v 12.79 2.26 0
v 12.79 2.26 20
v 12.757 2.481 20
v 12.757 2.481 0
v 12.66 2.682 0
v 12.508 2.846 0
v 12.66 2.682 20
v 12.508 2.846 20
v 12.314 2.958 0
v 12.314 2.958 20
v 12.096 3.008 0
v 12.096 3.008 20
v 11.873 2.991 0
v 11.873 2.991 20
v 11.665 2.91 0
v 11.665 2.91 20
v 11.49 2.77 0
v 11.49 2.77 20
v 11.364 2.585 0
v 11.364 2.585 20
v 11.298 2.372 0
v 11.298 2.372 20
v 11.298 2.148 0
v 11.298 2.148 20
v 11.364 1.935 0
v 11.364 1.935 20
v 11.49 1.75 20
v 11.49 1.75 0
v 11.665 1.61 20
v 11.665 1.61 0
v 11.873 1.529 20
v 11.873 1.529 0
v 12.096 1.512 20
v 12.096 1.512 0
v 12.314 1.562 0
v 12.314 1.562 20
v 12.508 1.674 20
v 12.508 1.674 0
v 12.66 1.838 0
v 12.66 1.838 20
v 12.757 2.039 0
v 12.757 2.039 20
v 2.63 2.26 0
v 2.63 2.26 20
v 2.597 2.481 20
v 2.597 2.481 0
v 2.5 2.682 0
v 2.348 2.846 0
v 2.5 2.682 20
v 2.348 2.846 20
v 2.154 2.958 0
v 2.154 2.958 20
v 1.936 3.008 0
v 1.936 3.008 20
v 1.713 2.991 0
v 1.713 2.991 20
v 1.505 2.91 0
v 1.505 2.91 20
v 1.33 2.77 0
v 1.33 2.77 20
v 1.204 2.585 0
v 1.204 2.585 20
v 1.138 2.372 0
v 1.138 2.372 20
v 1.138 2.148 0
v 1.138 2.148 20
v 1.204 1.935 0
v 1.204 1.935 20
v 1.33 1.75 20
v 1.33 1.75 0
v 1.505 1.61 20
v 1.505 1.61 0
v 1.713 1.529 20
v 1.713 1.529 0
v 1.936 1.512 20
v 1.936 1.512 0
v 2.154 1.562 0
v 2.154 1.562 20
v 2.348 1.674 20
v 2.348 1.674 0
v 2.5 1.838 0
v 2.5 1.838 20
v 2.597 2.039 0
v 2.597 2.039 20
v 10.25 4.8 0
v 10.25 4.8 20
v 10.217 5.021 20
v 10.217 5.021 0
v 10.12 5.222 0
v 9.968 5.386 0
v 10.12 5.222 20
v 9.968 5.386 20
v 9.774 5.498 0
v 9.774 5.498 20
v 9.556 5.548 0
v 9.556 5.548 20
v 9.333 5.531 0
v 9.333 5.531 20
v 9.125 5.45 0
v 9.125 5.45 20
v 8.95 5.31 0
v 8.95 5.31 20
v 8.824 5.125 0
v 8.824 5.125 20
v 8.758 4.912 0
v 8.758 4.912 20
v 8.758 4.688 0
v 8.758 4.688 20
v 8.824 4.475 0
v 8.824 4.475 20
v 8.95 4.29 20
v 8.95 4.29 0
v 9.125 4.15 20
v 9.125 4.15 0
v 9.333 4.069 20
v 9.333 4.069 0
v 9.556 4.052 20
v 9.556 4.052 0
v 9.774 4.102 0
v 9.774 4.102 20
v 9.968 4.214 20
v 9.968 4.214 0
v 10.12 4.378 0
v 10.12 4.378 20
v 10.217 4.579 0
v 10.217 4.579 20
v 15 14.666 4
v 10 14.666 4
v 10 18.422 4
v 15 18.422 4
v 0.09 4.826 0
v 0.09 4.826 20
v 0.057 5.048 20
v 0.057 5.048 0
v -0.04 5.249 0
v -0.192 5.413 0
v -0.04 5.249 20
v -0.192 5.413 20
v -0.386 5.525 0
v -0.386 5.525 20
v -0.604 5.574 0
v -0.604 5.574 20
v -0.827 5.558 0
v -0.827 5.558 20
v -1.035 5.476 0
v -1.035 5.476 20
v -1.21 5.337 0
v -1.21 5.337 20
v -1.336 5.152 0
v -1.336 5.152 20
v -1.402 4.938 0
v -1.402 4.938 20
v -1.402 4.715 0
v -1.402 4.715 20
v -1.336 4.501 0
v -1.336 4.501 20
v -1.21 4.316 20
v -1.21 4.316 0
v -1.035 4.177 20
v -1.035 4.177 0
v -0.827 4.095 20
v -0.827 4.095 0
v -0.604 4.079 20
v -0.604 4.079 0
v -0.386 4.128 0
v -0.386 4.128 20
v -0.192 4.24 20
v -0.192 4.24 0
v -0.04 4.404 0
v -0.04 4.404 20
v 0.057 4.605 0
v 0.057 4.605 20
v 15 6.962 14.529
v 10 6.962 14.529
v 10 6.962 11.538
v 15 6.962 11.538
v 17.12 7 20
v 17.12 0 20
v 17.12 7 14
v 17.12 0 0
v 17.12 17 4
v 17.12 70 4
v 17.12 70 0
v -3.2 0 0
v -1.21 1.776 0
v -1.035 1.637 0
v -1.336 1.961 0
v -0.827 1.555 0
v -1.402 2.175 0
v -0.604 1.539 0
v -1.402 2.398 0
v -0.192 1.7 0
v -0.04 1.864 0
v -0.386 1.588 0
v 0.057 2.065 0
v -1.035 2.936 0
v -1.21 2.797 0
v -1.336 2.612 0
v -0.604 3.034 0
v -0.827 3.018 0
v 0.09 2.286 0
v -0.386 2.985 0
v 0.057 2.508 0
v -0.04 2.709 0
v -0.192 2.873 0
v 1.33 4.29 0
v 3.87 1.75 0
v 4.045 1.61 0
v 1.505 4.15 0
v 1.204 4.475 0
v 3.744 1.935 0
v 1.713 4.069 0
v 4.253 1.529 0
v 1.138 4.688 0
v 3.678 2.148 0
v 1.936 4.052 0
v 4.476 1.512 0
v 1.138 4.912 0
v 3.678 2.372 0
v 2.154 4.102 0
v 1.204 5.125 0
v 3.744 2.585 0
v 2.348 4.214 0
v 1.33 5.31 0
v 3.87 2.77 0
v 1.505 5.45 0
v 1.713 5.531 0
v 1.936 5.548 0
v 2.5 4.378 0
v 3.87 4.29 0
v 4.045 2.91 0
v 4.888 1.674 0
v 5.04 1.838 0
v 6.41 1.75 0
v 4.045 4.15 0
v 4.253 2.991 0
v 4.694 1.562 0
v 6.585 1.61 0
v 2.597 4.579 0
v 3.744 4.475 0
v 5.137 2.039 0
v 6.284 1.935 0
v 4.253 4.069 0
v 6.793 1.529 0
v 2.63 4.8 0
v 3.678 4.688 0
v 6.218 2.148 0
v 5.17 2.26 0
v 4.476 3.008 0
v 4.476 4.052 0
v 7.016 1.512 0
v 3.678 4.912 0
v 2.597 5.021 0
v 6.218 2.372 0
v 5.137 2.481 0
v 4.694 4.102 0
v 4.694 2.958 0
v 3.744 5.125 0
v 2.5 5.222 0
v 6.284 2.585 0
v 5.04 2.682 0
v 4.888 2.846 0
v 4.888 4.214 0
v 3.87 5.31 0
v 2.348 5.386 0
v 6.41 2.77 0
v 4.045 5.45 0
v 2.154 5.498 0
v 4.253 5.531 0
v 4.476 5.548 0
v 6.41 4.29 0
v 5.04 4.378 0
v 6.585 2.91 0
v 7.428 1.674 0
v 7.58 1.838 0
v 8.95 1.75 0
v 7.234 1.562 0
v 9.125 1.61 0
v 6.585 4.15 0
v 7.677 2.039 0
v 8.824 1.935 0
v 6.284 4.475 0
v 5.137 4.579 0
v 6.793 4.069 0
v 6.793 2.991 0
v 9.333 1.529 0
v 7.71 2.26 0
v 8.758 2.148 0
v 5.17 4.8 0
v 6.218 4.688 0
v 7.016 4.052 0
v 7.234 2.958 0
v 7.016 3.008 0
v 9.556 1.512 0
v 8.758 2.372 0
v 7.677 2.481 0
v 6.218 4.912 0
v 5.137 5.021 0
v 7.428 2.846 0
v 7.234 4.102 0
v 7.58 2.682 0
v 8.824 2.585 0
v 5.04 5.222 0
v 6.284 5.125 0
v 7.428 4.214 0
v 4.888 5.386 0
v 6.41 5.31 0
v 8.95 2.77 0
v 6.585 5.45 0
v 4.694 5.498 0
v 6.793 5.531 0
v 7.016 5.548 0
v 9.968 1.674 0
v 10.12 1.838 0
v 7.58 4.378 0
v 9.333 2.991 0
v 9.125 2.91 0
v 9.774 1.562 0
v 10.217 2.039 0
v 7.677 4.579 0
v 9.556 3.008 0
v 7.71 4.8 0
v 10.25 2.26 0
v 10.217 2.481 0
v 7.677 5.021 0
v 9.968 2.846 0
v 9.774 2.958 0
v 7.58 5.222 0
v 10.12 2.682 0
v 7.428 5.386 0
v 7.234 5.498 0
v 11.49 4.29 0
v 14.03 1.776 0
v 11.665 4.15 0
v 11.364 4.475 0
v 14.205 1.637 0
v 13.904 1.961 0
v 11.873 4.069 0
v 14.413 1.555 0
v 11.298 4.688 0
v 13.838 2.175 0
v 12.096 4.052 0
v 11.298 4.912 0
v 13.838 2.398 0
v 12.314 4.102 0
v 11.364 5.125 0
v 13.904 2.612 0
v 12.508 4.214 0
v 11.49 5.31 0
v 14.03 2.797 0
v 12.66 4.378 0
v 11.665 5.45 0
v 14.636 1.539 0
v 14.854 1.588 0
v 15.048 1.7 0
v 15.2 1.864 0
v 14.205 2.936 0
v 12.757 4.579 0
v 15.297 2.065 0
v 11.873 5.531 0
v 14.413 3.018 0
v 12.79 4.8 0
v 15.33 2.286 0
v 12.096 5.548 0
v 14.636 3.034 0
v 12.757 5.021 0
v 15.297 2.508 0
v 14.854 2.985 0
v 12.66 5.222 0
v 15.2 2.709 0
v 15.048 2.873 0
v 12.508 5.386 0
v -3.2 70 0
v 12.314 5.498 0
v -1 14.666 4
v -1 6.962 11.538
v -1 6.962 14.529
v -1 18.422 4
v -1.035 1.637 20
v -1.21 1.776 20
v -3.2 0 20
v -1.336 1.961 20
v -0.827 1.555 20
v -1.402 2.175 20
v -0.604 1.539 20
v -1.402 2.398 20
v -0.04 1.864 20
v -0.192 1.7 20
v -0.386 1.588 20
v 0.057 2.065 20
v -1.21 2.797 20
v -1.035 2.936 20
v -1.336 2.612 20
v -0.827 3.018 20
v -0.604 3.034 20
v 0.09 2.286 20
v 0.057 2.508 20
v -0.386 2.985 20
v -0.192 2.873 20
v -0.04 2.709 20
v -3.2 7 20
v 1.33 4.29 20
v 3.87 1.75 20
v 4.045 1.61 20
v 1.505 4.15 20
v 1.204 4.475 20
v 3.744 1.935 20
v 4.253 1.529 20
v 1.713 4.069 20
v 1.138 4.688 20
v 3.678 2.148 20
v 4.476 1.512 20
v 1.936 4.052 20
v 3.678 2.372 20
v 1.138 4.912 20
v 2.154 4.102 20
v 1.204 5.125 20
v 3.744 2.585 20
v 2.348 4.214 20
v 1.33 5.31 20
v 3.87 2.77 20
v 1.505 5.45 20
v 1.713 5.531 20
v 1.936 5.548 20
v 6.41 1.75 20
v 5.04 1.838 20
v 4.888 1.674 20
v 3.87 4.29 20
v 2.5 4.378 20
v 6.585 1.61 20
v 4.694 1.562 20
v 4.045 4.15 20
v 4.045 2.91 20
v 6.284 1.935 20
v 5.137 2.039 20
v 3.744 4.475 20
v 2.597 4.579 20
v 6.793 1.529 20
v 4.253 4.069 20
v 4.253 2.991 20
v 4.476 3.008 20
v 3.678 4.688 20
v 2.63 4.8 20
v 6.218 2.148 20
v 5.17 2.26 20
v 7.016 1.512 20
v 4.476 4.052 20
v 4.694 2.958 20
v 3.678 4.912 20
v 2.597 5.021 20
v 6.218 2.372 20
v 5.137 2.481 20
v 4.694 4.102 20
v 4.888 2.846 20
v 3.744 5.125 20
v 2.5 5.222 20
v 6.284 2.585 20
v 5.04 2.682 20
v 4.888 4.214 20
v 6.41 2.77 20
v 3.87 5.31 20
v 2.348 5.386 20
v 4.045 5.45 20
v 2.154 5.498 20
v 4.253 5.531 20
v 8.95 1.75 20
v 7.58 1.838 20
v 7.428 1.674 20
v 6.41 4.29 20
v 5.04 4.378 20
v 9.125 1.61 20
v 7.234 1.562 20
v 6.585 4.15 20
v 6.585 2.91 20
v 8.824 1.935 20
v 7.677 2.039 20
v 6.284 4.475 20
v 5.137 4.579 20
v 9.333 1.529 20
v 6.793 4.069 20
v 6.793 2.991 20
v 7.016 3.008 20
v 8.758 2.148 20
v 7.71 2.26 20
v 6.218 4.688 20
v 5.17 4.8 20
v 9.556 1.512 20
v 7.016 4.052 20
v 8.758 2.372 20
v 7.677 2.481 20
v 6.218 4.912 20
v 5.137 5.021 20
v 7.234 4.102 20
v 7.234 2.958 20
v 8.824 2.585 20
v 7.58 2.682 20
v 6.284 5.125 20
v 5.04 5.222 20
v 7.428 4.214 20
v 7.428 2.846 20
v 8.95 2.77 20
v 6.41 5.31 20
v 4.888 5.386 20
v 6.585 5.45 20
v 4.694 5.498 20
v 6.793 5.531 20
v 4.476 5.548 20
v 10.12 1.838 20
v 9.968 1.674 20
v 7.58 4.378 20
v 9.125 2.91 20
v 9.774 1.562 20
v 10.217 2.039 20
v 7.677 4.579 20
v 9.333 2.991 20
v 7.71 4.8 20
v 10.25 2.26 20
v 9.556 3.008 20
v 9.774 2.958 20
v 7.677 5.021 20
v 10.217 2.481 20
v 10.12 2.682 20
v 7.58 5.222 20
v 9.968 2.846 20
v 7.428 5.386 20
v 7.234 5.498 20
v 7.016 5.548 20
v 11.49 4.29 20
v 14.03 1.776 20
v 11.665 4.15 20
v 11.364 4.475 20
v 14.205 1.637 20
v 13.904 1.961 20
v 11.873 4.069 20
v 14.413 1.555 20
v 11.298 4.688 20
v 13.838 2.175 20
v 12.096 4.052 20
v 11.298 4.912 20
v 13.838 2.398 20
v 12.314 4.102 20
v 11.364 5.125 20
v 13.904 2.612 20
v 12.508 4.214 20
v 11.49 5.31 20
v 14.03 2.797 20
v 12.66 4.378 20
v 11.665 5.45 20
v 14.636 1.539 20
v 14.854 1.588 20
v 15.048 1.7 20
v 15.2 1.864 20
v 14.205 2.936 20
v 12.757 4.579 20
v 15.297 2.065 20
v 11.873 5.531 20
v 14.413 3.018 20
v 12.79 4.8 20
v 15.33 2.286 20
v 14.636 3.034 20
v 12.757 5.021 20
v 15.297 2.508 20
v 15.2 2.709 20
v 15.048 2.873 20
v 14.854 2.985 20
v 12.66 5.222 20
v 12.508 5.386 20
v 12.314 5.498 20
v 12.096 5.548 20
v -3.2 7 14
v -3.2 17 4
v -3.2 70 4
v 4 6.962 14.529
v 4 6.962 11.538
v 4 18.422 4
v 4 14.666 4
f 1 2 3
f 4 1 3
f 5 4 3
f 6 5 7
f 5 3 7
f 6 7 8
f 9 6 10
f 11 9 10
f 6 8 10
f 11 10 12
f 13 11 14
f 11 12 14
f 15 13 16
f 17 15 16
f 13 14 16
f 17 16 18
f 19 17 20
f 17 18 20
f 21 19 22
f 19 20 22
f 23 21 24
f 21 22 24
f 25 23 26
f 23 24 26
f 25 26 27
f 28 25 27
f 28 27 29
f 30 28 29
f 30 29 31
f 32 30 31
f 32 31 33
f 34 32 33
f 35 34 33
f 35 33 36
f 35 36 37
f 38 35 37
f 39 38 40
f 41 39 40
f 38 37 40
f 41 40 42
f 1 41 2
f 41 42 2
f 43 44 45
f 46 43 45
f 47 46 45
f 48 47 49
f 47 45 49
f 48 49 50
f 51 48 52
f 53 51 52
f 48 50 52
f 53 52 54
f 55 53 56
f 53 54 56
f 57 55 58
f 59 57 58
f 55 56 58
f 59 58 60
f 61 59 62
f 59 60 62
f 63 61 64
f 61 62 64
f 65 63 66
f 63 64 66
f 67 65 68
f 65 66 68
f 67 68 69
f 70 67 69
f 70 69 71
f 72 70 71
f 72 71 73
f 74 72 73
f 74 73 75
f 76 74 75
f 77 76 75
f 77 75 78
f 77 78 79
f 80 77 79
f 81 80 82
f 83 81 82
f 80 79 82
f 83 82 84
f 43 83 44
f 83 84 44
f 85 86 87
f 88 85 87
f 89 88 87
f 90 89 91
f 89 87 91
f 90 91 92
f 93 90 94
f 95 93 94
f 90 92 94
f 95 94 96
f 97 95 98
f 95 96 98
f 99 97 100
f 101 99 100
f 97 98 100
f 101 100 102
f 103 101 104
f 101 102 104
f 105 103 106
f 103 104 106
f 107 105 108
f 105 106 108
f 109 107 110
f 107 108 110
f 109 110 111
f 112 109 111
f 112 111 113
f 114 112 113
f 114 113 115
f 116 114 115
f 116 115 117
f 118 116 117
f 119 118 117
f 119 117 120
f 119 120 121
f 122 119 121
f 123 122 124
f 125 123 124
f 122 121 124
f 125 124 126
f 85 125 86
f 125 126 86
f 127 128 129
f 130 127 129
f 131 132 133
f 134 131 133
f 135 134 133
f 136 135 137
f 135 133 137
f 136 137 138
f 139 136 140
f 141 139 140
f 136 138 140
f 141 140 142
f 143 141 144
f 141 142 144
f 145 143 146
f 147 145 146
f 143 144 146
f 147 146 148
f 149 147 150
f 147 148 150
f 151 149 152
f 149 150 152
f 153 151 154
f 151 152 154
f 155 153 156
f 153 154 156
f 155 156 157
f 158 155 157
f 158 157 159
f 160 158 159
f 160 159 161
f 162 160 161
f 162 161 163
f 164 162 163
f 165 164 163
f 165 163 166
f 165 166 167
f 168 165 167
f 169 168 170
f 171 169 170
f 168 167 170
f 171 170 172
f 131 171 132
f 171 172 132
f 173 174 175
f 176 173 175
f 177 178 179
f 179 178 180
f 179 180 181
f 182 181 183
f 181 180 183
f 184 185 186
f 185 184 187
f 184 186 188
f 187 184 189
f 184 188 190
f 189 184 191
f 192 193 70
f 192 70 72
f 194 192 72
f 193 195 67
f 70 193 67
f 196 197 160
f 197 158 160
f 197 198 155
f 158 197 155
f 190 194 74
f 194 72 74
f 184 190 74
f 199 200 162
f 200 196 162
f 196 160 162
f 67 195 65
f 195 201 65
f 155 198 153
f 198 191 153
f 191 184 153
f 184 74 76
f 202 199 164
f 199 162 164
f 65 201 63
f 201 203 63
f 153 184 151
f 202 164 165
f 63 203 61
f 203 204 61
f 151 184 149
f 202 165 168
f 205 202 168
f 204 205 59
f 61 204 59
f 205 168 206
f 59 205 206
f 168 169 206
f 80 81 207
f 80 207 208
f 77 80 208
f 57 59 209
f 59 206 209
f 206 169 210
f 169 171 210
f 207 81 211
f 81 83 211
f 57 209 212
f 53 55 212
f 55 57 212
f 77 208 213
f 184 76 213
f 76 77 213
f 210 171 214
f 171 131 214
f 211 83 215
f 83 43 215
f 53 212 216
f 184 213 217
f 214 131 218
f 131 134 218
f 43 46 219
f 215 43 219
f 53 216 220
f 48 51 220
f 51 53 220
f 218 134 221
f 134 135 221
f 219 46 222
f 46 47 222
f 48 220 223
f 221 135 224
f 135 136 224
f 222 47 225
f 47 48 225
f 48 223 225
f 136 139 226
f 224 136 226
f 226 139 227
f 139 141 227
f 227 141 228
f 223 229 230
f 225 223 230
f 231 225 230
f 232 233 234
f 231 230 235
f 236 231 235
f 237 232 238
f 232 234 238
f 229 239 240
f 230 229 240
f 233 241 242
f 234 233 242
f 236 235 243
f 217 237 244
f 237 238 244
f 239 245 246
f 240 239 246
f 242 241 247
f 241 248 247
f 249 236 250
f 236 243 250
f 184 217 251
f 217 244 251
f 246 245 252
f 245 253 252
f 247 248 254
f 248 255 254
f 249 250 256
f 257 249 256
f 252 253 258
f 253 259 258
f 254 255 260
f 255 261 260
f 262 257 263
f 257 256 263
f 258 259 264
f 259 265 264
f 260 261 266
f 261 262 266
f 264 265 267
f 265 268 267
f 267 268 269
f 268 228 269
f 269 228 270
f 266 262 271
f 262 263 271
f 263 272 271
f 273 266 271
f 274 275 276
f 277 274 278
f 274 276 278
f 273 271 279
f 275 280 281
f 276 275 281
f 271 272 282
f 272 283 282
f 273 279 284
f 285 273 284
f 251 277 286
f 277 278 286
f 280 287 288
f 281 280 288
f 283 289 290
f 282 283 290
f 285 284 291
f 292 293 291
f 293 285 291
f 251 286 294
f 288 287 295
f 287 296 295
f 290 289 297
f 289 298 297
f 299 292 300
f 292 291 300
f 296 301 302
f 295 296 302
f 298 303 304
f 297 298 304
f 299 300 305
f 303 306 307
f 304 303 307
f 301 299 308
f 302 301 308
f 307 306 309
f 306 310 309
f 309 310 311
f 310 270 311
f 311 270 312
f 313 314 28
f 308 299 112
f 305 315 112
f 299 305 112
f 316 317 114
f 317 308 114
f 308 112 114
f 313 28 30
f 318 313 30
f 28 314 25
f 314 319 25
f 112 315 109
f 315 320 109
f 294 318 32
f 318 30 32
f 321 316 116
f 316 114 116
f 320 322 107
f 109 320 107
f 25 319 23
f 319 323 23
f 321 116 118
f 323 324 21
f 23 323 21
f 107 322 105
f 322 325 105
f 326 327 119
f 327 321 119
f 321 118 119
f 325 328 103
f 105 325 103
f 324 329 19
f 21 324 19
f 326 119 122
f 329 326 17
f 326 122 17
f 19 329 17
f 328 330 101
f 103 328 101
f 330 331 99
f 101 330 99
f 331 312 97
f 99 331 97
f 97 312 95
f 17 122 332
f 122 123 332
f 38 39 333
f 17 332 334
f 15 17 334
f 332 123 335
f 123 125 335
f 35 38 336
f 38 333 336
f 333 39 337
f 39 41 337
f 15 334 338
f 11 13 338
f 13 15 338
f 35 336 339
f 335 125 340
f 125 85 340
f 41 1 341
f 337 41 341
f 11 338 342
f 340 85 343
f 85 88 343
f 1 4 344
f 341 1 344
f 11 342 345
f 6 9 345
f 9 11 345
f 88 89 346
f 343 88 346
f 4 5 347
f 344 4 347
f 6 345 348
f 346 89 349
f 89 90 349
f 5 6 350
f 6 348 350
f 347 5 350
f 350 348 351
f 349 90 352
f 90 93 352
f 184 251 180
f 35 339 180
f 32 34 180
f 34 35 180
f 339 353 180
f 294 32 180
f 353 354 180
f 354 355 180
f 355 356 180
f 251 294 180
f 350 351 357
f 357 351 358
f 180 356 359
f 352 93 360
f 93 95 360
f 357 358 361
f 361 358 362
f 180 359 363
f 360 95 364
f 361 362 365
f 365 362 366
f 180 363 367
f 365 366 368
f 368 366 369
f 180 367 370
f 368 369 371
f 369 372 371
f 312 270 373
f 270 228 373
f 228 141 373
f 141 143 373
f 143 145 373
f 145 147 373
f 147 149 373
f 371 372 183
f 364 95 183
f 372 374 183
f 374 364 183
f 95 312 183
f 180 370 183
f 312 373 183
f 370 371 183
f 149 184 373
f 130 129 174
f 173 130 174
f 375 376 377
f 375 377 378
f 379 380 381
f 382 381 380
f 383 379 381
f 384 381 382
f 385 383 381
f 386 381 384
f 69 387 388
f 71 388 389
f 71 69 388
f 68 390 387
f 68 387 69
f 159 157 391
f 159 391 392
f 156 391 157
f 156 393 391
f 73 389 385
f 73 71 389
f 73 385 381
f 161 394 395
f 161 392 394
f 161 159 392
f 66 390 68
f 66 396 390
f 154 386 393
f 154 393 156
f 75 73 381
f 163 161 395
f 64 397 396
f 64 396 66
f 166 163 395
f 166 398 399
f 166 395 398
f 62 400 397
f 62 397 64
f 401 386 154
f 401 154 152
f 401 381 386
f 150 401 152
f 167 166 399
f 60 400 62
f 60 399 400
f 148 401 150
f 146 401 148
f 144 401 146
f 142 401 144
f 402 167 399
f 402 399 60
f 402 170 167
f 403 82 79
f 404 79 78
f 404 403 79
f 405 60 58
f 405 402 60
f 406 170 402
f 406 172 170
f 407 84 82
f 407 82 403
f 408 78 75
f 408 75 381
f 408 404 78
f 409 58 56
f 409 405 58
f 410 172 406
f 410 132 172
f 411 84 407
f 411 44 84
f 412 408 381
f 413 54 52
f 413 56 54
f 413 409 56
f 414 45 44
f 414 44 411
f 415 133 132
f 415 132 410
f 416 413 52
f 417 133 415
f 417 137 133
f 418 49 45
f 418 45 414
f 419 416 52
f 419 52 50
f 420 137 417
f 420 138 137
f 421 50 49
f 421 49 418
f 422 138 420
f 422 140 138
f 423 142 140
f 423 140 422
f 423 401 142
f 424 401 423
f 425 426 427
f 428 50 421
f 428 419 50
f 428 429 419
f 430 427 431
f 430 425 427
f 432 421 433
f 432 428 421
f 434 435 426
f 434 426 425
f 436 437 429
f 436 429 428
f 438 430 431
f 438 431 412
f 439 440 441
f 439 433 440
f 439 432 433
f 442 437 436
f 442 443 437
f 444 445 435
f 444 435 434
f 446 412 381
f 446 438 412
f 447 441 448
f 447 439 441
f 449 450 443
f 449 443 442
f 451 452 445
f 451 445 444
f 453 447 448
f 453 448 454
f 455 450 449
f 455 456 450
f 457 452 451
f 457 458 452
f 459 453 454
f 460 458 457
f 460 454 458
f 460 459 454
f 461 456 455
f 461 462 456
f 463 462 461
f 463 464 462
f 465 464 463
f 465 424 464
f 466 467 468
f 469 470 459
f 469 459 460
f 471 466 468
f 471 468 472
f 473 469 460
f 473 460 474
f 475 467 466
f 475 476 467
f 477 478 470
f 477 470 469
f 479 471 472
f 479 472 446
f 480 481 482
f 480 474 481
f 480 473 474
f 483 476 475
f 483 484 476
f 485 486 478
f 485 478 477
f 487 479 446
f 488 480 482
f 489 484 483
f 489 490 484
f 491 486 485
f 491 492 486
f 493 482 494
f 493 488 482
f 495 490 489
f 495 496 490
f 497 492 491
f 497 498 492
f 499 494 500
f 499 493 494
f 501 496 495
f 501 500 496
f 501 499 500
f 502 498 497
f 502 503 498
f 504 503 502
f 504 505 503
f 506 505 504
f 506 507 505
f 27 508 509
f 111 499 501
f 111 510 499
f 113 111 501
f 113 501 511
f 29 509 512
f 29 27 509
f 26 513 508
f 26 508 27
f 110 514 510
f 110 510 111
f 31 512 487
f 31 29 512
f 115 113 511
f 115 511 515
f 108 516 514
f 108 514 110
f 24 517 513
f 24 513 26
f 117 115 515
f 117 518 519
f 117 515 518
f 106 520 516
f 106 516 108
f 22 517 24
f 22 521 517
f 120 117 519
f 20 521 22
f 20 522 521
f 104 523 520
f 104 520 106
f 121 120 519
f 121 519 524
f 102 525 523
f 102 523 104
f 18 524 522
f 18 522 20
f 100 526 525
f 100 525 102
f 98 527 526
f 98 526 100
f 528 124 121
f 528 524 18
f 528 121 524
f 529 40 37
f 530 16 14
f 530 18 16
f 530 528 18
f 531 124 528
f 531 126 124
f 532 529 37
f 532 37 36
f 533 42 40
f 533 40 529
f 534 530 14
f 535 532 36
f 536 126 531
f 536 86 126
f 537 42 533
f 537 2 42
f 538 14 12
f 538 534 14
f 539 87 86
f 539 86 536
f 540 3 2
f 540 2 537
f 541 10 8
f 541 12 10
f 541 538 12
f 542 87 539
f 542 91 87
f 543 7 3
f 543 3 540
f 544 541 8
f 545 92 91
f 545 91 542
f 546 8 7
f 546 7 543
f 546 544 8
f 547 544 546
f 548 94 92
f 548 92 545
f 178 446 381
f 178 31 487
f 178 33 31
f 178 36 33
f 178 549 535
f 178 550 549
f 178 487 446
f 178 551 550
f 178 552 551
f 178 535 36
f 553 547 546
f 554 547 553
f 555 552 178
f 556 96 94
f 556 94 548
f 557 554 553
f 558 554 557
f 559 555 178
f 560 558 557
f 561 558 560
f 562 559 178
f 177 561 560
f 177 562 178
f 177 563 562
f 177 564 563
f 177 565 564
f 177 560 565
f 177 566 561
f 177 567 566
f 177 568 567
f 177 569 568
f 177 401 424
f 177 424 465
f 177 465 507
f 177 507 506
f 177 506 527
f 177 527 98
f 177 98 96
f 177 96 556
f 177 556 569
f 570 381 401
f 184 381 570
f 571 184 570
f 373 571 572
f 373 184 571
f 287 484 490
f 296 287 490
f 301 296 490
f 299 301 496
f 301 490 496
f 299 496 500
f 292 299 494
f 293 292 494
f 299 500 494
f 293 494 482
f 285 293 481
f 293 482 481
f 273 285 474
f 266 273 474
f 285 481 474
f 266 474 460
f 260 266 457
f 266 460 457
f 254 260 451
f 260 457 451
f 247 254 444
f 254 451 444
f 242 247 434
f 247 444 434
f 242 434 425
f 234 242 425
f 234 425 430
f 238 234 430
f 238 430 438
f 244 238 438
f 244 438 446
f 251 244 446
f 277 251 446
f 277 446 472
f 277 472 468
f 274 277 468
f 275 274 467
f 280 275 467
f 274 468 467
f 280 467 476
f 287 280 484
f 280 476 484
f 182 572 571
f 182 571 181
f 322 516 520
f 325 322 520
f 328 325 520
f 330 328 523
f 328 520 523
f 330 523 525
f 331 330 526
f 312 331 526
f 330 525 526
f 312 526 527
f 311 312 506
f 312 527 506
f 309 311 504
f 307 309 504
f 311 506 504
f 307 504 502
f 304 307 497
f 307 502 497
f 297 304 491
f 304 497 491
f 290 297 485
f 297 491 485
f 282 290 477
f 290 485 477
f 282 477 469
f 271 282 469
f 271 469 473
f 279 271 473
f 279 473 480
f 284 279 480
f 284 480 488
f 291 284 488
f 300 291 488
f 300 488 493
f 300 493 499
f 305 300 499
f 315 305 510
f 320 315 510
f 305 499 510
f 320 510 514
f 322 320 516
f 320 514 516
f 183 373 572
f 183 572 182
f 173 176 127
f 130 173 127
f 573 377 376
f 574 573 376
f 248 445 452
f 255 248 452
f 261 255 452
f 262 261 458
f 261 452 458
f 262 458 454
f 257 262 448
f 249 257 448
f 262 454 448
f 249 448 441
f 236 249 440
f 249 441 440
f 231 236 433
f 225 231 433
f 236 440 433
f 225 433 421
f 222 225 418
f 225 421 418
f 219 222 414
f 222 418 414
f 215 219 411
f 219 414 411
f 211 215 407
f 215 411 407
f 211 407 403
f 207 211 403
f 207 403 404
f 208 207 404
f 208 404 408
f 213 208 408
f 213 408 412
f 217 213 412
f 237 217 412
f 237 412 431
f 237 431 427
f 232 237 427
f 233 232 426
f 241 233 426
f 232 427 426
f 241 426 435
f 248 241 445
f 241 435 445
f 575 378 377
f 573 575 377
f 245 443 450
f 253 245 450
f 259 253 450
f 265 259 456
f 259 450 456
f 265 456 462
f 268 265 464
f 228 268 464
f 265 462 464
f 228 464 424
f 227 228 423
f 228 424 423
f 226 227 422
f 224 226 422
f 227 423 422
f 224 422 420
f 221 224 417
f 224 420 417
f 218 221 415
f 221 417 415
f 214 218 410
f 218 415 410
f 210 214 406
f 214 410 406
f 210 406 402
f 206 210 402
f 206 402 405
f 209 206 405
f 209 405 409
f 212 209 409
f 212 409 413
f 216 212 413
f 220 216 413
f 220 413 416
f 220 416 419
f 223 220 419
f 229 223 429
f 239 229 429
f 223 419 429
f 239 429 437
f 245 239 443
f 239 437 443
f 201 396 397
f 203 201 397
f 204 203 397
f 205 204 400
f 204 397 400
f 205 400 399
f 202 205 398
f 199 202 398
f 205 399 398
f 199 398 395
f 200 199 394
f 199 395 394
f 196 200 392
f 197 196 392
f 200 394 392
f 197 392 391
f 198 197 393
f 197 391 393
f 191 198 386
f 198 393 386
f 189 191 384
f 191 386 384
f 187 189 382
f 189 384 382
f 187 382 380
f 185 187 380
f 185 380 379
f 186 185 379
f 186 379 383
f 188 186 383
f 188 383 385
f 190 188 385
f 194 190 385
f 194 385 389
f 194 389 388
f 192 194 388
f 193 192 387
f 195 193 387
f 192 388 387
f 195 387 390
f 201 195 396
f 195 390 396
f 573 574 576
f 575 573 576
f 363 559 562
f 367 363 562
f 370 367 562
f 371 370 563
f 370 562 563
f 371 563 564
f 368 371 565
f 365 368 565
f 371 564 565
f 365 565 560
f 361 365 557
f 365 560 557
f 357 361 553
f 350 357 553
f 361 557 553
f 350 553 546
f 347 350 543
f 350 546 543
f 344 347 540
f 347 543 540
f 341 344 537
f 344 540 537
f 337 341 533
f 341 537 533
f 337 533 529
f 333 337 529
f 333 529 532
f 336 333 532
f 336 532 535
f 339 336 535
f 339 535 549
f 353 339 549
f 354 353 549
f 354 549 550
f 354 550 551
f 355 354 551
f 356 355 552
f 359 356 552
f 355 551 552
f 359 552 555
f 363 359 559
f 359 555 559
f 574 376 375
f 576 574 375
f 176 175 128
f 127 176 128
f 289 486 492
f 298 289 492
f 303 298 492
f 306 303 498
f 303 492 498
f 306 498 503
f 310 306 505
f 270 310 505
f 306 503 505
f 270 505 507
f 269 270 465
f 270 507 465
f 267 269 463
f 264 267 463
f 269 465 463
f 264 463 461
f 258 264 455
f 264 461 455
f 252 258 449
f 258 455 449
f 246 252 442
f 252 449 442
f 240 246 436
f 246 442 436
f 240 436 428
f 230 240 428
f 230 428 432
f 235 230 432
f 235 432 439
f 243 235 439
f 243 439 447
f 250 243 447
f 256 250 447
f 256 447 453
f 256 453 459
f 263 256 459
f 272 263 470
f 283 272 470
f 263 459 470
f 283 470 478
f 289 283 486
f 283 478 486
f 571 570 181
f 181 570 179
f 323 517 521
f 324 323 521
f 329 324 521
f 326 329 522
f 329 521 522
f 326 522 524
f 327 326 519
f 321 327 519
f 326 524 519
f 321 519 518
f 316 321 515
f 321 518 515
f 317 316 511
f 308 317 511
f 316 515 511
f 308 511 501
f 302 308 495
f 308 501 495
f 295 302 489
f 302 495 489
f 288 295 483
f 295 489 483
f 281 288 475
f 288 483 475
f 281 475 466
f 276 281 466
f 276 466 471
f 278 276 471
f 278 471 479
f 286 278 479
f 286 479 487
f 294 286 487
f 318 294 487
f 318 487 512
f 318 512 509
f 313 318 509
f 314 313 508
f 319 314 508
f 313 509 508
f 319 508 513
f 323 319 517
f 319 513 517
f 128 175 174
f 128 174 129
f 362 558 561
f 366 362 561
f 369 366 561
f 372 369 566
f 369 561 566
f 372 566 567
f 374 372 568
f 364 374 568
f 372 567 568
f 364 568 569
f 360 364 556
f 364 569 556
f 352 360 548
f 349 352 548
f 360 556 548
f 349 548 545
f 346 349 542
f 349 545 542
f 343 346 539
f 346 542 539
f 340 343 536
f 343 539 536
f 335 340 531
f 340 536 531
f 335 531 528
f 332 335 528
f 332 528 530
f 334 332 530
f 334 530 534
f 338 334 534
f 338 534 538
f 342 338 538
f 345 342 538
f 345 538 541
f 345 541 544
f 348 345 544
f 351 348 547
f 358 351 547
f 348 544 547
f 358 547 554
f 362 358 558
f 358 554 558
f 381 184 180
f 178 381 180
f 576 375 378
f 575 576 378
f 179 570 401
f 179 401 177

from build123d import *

# Parameters (mm, degrees)
PAD_DEPTH    = 5
PAD001_DEPTH = 5
BOX002_W     = 20.32
BOX002_H     = 63
BOX002_DEPTH = 4
BOX_W        = 20.32
BOX_H        = 7
BOX_DEPTH    = 20
SKETCH_R     = 0.75
POCKET_DEPTH = 20
CHAMFER_SIZE = 10


with BuildPart() as pad:
    # Sketch001 → Pad (new body)
    with BuildSketch(Plane.YZ.offset(-1)):
        Polygon((6.961547, 14.529416), (6.961547, 11.537694), (14.666037, 4), (18.422146, 4), align=None)
    extrude(amount=PAD_DEPTH)


with BuildPart() as pad001:
    # Sketch002 → Pad001 (new body)
    with BuildSketch(Plane.YZ.offset(10)):
        Polygon((6.961547, 14.529416), (6.961547, 11.537694), (14.666037, 4), (18.422146, 4), align=None)
    extrude(amount=PAD001_DEPTH)


with BuildPart() as cube002:
    # Box002 → Box002 (new body)
    with BuildSketch(Plane(origin=(-3.2, 7, 0), x_dir=(1, 0, 0), z_dir=(0, 0, 1))):
        with Locations((10.16, 31.5)):
            Rectangle(BOX002_W, BOX002_H)
    extrude(amount=BOX002_DEPTH)


with BuildPart() as chamfer_body:
    # Box → Box (new body)
    with BuildSketch(Plane(origin=(-3.2, 0, 0), x_dir=(1, 0, 0), z_dir=(0, 0, 1))):
        with Locations((10.16, 3.5)):
            Rectangle(BOX_W, BOX_H)
    extrude(amount=BOX_DEPTH)

    # Sketch → Pocket (cut)
    with BuildSketch(Plane(origin=(-3.2, 0, 20), x_dir=(1, 0, 0), z_dir=(0, 0, 1))):
        with Locations((5.08, 2.26)):
            Circle(SKETCH_R)
        with Locations((7.62, 2.26)):
            Circle(SKETCH_R)
        with Locations((10.16, 2.26)):
            Circle(SKETCH_R)
        with Locations((12.7, 2.26)):
            Circle(SKETCH_R)
        with Locations((15.24, 2.26)):
            Circle(SKETCH_R)
        with Locations((5.08, 4.8)):
            Circle(SKETCH_R)
        with Locations((7.62, 4.8)):
            Circle(SKETCH_R)
        with Locations((10.16, 4.8)):
            Circle(SKETCH_R)
        with Locations((12.7, 4.8)):
            Circle(SKETCH_R)
        with Locations((15.24, 4.8)):
            Circle(SKETCH_R)
        with Locations((2.54, 2.286478)):
            Circle(SKETCH_R)
        with Locations((2.54, 4.826478)):
            Circle(SKETCH_R)
        with Locations((17.78, 2.286478)):
            Circle(SKETCH_R)
    extrude(amount=-POCKET_DEPTH, mode=Mode.SUBTRACT)

    # Fusion: union Cube002
    add(cube002.part)

    # Chamfer
    chamfer_edges = [chamfer_body.edges().sort_by_distance(p)[0] for p in [
        (6.96, 7, 4),
    ]]
    chamfer(chamfer_edges, length=CHAMFER_SIZE)


solid = Compound([pad.part, pad001.part, chamfer_body.part])
